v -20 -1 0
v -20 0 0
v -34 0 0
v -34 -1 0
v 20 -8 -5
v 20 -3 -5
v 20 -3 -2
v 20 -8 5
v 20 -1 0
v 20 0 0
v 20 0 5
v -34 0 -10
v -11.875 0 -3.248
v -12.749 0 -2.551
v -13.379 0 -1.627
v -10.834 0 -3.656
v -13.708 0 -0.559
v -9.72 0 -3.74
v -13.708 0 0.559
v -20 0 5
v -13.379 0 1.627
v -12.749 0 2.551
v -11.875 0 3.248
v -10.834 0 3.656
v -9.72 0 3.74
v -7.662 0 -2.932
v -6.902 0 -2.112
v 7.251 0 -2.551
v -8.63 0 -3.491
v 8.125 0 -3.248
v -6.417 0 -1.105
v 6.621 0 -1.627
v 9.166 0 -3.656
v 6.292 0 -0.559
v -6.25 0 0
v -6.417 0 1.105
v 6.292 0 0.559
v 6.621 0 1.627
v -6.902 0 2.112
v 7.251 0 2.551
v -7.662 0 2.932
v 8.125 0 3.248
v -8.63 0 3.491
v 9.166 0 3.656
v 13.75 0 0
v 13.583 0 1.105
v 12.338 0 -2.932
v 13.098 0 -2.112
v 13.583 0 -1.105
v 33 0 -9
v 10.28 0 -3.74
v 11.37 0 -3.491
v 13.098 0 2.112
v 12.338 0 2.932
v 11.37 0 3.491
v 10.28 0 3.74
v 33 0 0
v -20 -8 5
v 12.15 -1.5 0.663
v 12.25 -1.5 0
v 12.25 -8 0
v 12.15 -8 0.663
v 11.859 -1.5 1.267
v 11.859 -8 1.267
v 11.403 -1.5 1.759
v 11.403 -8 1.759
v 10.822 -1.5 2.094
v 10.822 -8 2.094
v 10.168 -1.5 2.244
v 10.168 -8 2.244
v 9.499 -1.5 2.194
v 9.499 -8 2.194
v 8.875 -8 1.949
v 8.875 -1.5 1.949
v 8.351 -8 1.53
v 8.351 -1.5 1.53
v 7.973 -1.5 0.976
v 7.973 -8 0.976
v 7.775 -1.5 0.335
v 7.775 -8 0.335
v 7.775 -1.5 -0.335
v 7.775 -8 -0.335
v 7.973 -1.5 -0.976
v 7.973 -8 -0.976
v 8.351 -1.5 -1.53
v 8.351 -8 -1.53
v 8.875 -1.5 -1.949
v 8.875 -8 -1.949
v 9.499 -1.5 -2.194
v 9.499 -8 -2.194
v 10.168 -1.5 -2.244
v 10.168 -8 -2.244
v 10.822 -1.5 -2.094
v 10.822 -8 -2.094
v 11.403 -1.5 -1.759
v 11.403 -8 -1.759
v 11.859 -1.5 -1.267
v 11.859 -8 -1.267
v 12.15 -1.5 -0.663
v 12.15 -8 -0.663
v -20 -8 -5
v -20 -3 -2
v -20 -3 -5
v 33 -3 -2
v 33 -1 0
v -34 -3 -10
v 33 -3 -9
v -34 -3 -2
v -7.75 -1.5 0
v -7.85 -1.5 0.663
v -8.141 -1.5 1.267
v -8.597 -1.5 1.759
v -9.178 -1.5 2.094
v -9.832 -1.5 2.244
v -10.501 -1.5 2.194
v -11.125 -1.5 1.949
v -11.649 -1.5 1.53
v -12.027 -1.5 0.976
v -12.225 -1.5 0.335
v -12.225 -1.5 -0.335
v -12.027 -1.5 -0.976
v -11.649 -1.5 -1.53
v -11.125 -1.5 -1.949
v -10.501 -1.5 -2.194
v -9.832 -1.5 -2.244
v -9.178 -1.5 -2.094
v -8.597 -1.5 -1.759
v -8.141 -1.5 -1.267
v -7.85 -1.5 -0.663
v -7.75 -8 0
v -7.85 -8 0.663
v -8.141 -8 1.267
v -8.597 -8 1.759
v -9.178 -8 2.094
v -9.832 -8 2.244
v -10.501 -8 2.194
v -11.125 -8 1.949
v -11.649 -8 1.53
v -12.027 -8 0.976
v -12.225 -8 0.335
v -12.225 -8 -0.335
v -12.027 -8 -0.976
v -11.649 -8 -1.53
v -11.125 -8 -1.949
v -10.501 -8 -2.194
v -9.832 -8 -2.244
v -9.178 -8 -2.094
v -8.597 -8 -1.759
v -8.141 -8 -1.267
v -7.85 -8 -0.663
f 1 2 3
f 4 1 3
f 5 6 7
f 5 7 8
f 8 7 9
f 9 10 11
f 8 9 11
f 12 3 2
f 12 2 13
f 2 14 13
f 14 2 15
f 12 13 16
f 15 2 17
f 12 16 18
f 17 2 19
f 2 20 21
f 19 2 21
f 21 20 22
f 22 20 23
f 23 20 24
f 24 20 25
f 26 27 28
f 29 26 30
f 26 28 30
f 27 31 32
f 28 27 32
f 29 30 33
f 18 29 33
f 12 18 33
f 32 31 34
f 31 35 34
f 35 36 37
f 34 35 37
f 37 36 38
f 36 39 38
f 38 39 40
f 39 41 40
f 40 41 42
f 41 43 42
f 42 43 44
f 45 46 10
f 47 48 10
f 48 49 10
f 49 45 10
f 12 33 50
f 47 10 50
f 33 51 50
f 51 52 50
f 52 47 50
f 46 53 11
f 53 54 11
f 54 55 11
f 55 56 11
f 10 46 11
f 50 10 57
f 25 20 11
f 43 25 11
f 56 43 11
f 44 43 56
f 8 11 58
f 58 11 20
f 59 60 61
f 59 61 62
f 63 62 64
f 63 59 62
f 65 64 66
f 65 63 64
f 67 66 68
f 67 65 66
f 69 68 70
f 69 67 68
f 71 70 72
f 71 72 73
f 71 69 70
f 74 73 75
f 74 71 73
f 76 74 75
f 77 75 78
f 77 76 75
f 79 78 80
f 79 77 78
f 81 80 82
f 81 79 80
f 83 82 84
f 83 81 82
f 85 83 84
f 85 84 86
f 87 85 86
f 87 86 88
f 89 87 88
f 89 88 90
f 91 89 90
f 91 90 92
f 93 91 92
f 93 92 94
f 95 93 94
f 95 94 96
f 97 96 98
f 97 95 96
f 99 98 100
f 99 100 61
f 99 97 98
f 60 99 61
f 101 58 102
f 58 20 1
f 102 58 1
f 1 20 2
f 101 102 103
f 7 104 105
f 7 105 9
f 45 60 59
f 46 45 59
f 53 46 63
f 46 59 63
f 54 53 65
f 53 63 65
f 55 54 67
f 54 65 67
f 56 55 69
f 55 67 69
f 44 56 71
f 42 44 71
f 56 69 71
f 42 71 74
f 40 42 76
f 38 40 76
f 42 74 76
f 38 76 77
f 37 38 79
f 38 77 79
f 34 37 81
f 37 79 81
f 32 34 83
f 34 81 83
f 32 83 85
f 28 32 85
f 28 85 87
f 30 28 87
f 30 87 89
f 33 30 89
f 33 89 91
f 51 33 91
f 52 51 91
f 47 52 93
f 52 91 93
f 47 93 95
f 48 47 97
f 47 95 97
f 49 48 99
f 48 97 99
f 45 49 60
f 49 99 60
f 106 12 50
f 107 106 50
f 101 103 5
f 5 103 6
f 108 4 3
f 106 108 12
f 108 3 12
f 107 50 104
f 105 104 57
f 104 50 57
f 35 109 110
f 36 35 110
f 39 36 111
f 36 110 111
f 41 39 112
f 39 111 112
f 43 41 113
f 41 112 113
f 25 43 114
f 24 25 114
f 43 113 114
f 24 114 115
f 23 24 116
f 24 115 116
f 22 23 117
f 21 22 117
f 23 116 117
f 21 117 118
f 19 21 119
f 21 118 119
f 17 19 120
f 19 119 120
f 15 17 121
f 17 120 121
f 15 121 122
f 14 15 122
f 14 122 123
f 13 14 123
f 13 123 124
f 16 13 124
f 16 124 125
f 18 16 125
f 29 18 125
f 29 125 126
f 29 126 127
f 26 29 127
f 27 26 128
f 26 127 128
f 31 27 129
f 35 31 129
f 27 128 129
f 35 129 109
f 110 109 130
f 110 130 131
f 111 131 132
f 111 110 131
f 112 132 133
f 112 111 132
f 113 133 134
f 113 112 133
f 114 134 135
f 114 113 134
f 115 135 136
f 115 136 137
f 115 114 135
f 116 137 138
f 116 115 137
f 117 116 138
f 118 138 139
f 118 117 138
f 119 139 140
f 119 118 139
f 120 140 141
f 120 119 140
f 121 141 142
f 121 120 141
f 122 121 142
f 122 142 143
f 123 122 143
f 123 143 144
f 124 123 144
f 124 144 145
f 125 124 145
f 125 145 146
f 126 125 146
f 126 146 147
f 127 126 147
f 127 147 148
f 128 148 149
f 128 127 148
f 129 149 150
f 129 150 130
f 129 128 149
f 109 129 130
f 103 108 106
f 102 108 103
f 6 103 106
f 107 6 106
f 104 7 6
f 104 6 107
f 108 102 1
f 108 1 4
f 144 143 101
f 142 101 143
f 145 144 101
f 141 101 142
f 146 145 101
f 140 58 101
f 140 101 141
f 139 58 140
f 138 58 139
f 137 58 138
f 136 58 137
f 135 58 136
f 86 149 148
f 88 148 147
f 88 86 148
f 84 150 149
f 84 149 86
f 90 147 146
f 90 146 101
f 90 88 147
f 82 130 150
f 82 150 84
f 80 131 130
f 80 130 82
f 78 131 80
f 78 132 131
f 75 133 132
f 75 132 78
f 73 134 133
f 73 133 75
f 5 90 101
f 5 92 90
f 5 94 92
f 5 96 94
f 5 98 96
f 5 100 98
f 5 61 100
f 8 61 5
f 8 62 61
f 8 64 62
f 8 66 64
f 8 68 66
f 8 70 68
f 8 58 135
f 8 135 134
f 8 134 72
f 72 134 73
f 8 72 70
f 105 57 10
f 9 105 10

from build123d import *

# Parameters (mm, degrees)
F1_DEPTH = 3
F0_R     = 2.25
F2_DEPTH = 8
F3_SIZE  = 1.5
F4_SIZE  = 2


with BuildPart() as f1:
    # F0 (on Front) → F1 (new body)
    with BuildSketch(Plane.XZ):
        Polygon((-20, -5), (-20, 0), (-34, 0), (-34, -10), (33, -9), (33, 0), (20, 0), (20, -5), align=None)
    extrude(amount=F1_DEPTH)

    # F0 (on Front) → F2 (join)
    with BuildSketch(Plane.XZ):
        Polygon((20, 5), (-20, 5), (-20, 0), (-20, -5), (20, -5), (20, 0), align=None)
        with Locations((-10, 0)):
            Circle(F0_R, mode=Mode.SUBTRACT)
        with Locations((10, 0)):
            Circle(F0_R, mode=Mode.SUBTRACT)
    extrude(amount=F2_DEPTH)

    # F3
    f3_edges = [f1.edges().sort_by_distance(p)[0] for p in [
        (7.75, 0, 0),
        (-12.25, 0, 0),
    ]]
    chamfer(f3_edges, length=F3_SIZE)

    # F4
    f4_edges = [f1.edges().sort_by_distance(p)[0] for p in [
        (-27, -3, 0),
        (26.5, -3, 0),
    ]]
    chamfer(f4_edges, length=F4_SIZE)


solid = f1.part
